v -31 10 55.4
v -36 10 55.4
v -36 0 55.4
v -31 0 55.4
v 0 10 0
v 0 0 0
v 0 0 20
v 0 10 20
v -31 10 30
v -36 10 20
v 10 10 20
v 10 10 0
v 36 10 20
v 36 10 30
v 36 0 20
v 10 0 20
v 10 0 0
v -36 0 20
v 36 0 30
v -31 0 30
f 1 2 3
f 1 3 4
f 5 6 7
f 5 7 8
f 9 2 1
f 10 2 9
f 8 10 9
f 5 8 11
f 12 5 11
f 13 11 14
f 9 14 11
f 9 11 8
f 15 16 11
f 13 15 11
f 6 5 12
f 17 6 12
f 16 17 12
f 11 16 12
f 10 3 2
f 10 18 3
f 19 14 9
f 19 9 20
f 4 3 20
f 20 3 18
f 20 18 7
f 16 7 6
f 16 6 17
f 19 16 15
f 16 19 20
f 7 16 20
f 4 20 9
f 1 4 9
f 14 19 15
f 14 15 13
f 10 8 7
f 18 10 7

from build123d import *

# Parameters (mm, degrees)
SKETCH_W     = 10
SKETCH_H     = 10
PAD_DEPTH    = 30
SKETCH001_W  = 10
SKETCH001_H  = 10
PAD001_DEPTH = 26
SKETCH002_W  = 10
SKETCH002_H  = 10
PAD002_DEPTH = 36
SKETCH003_W  = 5
SKETCH003_H  = 10
PAD003_DEPTH = 25.4


with BuildPart() as part:
    # Sketch → Pad (new body)
    with BuildSketch(Plane.XY):
        with Locations((5, 5)):
            Rectangle(SKETCH_W, SKETCH_H)
    extrude(amount=PAD_DEPTH)

    # Sketch001 (on Face2 of Pad) → Pad001 (join)
    with BuildSketch(Plane.YZ.offset(10)):
        with Locations((5, 25)):
            Rectangle(SKETCH001_W, SKETCH001_H)
    extrude(amount=PAD001_DEPTH)

    # Sketch002 (on Face3 of Pad001) → Pad002 (join)
    with BuildSketch(Plane(origin=(0, 0, 0), x_dir=(0, -1, 0), z_dir=(-1, 0, 0))):
        with Locations((-5, 25)):
            Rectangle(SKETCH002_W, SKETCH002_H)
    extrude(amount=PAD002_DEPTH)

    # Sketch003 (on Face10 of Pad002) → Pad003 (join)
    with BuildSketch(Plane.XY.offset(30)):
        with Locations((-33.5, 5)):
            Rectangle(SKETCH003_W, SKETCH003_H)
    extrude(amount=PAD003_DEPTH)


solid = part.part
